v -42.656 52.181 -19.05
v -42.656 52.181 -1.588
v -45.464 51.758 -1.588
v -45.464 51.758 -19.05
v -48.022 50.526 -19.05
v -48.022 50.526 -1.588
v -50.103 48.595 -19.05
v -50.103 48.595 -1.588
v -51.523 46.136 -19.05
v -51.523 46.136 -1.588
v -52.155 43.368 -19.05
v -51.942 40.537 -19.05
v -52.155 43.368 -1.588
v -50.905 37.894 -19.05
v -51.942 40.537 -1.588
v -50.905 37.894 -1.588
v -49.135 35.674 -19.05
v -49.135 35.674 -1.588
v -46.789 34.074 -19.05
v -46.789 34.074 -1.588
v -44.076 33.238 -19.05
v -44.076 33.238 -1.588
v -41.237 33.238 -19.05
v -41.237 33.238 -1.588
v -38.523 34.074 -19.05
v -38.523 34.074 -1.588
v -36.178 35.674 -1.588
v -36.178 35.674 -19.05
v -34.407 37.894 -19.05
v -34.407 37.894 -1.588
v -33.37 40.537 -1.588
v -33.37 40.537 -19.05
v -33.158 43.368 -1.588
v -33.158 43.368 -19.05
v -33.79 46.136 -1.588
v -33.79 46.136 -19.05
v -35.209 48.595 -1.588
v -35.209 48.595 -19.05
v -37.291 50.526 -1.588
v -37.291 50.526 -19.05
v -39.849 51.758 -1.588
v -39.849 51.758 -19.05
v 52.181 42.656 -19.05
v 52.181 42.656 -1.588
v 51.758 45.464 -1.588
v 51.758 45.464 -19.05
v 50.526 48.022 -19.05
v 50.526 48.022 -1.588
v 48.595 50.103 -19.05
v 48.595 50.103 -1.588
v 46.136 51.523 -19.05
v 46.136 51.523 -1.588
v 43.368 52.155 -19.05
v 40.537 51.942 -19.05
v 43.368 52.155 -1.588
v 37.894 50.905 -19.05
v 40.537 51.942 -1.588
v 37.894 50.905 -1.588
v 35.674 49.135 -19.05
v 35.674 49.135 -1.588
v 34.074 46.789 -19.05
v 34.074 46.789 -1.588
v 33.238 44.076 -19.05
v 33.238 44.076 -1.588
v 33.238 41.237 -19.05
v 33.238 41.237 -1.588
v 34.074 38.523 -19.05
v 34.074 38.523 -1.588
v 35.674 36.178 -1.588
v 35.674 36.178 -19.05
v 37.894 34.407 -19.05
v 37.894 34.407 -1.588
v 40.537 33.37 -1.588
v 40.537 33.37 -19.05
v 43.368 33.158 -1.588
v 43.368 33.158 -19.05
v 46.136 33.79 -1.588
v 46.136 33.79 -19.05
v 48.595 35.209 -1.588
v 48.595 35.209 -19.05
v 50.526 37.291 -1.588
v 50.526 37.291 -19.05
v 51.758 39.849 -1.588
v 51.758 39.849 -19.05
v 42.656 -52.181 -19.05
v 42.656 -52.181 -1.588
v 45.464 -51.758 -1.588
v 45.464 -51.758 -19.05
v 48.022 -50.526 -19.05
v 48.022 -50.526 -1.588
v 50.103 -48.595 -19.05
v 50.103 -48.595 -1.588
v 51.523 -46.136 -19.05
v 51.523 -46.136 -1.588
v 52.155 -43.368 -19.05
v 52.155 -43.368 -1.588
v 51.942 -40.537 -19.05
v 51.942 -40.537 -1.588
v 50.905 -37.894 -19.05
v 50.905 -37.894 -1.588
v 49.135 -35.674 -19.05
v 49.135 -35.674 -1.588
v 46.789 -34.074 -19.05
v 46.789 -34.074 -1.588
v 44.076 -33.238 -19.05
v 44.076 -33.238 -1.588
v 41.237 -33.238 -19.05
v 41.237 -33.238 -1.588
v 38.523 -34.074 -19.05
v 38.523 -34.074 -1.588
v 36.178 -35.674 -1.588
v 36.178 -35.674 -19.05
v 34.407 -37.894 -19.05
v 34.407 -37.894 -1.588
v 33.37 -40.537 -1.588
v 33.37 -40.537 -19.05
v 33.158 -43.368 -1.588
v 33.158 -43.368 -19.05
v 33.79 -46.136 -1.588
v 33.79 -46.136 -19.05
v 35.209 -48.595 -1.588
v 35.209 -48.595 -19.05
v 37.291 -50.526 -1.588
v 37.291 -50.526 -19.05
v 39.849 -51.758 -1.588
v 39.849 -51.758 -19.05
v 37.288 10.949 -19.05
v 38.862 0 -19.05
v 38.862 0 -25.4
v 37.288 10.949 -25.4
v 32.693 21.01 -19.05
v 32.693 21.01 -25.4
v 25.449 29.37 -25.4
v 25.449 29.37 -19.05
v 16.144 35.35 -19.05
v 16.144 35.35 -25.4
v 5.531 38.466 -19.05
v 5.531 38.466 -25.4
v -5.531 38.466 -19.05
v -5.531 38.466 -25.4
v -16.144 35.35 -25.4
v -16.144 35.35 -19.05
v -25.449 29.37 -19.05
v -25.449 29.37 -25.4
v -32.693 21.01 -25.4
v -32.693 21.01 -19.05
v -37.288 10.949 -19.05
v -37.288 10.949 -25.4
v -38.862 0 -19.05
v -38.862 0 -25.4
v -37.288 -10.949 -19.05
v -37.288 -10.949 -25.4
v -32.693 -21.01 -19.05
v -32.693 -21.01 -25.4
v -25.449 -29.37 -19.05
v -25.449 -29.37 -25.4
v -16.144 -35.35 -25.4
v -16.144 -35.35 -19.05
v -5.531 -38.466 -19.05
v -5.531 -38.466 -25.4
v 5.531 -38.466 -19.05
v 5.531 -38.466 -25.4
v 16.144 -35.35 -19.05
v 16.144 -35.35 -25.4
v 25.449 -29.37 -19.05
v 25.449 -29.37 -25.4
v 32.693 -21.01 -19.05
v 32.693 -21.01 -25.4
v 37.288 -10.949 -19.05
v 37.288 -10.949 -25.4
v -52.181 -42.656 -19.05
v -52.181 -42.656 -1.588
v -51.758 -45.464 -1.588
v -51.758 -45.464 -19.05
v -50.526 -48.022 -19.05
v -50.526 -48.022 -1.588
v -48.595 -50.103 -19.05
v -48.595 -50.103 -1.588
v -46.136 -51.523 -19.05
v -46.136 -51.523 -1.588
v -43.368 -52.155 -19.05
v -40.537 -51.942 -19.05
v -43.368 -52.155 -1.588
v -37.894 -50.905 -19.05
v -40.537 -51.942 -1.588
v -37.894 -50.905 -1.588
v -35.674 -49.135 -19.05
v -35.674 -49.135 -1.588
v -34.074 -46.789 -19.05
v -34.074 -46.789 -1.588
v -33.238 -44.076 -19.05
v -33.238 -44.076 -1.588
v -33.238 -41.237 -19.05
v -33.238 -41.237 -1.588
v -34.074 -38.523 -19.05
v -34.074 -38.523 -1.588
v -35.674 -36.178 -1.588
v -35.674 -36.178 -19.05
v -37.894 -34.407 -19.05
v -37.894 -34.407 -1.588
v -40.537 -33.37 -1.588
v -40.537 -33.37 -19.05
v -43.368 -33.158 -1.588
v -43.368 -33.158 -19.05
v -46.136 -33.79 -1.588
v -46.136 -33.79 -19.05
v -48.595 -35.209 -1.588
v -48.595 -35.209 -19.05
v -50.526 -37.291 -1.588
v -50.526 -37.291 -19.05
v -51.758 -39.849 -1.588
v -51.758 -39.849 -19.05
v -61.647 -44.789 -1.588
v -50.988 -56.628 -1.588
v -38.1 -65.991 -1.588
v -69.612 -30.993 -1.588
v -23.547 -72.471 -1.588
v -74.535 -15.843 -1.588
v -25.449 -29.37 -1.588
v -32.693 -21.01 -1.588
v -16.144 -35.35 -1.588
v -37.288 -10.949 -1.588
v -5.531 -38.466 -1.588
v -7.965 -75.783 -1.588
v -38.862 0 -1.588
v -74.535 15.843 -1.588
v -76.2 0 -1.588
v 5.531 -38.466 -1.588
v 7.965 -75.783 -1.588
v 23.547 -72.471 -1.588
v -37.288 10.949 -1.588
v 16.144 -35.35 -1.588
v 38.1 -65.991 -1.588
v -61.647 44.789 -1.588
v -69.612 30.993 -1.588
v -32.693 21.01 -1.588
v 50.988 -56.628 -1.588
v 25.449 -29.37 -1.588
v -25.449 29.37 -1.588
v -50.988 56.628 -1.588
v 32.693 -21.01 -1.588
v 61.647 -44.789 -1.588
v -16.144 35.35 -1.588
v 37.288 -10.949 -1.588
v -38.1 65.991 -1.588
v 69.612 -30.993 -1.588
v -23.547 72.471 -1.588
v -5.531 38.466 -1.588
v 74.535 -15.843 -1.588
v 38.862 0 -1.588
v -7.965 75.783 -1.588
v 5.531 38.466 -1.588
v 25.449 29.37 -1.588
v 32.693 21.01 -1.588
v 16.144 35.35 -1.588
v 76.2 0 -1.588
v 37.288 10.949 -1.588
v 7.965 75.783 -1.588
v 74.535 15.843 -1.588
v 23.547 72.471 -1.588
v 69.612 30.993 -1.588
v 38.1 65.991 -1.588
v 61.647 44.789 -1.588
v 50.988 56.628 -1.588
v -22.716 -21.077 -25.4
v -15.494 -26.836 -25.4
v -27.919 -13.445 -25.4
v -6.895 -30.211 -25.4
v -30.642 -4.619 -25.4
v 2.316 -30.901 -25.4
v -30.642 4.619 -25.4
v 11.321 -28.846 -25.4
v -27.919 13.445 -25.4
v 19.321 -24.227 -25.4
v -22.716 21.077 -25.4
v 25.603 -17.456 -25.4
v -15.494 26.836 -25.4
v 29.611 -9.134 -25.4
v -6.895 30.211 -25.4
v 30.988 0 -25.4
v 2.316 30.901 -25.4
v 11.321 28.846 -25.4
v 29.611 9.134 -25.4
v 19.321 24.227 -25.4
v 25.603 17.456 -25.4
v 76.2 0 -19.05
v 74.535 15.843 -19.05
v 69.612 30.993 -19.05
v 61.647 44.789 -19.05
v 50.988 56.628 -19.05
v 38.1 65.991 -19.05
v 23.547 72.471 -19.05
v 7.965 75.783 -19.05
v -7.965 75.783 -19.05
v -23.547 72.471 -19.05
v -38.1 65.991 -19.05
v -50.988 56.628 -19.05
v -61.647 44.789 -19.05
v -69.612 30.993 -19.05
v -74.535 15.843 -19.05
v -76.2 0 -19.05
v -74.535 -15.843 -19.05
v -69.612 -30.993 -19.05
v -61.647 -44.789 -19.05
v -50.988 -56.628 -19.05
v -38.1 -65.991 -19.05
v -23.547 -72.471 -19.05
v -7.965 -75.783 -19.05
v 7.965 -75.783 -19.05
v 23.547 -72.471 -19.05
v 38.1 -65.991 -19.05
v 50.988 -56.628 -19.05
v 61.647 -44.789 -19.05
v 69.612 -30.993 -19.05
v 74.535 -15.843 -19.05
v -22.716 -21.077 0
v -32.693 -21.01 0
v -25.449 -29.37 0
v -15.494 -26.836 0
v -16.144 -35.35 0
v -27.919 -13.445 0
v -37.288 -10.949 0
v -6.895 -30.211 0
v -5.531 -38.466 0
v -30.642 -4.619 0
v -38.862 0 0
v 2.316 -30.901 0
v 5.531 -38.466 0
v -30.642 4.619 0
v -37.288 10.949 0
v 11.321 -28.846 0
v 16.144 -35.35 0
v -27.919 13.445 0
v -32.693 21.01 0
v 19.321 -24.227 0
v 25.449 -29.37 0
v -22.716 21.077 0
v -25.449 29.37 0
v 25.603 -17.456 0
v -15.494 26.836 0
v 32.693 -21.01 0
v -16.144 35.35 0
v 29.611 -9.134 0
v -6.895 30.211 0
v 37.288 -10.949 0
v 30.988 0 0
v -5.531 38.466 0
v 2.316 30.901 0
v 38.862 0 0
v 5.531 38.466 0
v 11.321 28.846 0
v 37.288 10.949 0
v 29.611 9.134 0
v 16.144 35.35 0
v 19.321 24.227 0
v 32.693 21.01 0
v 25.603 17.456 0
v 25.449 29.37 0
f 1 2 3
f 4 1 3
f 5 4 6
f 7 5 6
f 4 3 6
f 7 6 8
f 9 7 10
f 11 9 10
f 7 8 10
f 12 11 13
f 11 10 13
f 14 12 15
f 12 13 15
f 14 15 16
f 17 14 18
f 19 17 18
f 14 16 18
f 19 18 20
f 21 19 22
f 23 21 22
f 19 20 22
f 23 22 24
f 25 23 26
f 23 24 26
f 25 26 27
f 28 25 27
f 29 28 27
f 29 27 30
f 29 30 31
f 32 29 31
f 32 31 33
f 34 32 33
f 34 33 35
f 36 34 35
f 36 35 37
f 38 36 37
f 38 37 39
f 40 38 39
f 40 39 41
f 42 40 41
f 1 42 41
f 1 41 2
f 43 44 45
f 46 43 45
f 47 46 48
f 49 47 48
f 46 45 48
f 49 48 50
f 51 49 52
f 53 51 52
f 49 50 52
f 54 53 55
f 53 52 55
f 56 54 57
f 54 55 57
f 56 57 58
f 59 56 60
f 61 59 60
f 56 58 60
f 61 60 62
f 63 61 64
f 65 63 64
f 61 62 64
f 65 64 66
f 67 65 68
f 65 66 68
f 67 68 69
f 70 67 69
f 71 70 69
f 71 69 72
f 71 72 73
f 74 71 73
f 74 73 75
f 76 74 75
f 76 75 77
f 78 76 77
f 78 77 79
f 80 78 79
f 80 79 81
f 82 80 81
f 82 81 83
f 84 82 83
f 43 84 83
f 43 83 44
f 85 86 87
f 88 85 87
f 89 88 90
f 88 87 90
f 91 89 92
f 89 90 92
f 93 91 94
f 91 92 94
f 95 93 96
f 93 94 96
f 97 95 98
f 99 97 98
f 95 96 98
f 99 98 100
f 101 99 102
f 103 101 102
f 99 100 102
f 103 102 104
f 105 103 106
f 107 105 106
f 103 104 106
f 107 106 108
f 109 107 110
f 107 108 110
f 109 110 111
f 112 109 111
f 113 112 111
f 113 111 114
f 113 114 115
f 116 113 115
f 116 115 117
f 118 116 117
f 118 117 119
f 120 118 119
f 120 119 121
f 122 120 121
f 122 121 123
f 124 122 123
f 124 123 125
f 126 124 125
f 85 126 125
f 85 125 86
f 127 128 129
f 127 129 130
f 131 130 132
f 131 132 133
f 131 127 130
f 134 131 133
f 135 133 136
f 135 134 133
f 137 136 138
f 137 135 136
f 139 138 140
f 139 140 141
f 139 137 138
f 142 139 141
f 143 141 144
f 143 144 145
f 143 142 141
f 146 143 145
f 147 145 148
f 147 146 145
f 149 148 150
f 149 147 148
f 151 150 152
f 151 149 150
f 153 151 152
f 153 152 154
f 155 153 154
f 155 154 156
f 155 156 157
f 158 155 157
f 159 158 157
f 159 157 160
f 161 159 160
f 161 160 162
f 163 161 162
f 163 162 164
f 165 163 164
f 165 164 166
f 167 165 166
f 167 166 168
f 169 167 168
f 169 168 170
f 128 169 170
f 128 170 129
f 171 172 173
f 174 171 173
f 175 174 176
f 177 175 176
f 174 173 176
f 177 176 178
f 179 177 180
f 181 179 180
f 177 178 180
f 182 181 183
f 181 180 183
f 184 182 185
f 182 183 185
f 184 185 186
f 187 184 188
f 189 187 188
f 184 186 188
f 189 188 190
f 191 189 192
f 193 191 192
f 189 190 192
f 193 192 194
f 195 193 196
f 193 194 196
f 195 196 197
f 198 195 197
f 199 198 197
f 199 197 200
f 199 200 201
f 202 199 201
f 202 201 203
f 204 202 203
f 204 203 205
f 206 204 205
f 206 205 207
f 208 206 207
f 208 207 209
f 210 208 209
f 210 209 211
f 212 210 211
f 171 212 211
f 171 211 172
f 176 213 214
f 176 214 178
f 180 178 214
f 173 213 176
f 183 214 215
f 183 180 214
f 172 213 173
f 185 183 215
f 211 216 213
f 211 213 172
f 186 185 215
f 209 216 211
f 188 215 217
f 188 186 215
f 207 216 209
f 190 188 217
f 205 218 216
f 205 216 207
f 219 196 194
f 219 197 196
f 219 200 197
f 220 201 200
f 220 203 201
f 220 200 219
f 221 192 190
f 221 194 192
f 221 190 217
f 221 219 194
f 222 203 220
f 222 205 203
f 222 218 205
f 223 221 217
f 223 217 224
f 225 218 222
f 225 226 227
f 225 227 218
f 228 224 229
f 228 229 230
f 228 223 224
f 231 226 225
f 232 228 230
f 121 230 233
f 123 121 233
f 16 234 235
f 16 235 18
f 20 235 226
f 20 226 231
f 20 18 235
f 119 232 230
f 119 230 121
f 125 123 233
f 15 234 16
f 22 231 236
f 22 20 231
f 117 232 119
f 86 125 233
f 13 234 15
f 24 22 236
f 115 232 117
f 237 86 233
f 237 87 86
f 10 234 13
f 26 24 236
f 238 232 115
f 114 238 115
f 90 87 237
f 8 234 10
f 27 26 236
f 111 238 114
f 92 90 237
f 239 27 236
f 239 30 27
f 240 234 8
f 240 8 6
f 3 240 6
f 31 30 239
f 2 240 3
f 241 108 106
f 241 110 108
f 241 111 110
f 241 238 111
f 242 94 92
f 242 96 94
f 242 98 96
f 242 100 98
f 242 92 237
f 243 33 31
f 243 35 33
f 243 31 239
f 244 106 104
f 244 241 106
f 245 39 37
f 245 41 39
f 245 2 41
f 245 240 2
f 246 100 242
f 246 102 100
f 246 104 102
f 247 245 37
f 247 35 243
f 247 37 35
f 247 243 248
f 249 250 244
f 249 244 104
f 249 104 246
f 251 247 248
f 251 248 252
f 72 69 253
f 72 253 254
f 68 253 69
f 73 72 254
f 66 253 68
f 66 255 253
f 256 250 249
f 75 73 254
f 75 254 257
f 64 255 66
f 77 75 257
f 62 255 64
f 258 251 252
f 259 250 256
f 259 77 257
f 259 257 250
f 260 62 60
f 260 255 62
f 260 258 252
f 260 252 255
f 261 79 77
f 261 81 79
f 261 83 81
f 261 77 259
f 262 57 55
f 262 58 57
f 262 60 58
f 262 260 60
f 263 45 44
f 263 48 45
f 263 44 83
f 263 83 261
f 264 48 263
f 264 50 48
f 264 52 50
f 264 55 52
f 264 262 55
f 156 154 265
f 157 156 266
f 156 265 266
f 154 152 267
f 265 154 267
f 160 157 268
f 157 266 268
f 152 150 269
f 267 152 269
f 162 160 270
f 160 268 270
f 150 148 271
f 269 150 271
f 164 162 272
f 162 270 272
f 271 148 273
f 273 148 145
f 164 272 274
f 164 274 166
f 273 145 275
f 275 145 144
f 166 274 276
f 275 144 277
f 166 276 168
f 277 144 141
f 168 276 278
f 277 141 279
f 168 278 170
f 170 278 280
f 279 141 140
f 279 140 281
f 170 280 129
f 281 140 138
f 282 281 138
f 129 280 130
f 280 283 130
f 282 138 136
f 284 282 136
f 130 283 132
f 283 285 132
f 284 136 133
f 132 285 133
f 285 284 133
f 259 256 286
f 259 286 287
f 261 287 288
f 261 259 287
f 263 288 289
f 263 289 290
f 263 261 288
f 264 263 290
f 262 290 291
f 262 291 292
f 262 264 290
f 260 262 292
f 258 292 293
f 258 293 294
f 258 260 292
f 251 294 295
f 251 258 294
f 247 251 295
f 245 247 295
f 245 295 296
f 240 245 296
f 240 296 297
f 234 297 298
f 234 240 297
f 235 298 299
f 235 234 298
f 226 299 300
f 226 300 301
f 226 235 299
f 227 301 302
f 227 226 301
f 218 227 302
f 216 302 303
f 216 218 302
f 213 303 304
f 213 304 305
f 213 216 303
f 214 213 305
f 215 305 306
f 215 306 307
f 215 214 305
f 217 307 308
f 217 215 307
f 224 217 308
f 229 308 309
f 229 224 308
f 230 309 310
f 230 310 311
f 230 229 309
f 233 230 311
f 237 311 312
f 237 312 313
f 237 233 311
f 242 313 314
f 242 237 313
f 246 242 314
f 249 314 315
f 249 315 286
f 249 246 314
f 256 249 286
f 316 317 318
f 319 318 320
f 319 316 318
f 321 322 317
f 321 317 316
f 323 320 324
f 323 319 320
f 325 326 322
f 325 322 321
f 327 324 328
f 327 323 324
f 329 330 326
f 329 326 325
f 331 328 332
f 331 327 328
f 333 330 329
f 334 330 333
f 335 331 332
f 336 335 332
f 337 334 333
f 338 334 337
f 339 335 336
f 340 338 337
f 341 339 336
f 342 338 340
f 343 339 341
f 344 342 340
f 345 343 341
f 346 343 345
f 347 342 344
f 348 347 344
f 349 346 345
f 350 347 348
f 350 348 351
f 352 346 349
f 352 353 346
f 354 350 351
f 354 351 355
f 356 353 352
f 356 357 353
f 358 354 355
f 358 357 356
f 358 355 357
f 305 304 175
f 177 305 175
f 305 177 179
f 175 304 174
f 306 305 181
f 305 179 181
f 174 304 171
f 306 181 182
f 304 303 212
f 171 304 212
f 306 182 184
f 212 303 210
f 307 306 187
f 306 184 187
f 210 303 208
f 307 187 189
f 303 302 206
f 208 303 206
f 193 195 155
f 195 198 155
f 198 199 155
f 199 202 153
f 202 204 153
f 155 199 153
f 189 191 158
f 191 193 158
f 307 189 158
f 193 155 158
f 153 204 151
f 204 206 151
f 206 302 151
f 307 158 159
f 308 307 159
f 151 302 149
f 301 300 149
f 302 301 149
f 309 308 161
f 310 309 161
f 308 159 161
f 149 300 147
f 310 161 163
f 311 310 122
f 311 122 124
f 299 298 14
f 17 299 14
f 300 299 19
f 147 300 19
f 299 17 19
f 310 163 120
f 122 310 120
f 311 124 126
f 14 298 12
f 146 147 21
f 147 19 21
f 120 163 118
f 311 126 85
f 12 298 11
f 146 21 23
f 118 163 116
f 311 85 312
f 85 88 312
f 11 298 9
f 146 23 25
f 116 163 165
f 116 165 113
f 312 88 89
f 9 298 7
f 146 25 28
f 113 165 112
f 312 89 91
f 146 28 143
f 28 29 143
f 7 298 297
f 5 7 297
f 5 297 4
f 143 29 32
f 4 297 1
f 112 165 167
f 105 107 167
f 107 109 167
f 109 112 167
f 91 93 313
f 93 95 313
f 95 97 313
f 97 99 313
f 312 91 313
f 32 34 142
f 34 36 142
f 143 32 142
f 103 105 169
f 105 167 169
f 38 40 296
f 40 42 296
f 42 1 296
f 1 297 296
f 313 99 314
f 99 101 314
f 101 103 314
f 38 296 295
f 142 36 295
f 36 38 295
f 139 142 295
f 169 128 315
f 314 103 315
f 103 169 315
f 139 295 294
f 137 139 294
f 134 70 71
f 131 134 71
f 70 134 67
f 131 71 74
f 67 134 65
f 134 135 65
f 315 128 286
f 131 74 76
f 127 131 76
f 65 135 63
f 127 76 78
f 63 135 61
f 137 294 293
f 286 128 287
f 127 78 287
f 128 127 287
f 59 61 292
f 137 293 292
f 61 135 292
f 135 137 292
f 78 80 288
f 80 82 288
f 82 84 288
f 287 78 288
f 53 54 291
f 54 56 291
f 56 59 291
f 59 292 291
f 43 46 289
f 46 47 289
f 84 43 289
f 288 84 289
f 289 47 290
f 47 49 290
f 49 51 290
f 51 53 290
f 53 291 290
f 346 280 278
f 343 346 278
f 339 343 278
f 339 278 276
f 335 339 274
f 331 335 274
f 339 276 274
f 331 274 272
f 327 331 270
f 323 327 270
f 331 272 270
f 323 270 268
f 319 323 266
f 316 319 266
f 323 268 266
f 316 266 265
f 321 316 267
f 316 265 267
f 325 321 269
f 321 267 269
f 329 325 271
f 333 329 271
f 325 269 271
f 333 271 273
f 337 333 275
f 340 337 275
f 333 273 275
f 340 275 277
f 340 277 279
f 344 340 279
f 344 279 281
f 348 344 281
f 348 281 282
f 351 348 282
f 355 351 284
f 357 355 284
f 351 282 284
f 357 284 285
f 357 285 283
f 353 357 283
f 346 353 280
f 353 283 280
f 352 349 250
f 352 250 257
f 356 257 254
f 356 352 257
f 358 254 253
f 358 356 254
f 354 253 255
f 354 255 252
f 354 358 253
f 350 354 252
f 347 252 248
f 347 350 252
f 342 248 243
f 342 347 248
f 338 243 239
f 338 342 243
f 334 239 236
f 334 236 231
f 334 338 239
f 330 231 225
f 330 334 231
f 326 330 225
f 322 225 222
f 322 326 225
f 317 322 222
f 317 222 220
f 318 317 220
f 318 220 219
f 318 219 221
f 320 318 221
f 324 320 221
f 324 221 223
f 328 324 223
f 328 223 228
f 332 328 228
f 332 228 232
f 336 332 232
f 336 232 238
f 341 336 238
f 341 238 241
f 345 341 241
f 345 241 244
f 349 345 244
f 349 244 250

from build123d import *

# Parameters (mm, degrees)
HUB_DIAMETER_R                = 38.862
HUB_DEPTH                     = 25.4
FLANGE_DIAMETER_R             = 76.2
FLANGE_DEPTH                  = 17.4625
REVOLUTION_PROFILE_FOR_BORE_W = 30.988
REVOLUTION_PROFILE_FOR_BORE_H = 228.6
BOLT_DIAMETER_R               = 9.525
BOLT_HOLE_DEPTH               = 111.362652905
BOLT_HOLE_PATTERN_COUNT       = 4
BOLT_HOLE_PATTERN_ANGLE       = 270


with BuildPart() as part:
    # Hub Diameter → Hub (new body)
    with BuildSketch(Plane.XY):
        Circle(HUB_DIAMETER_R)
    extrude(amount=-HUB_DEPTH)

    # Flange Diameter → Flange (add)
    with BuildSketch(Plane.XY.offset(-1.5875)):
        Circle(FLANGE_DIAMETER_R)
    extrude(amount=-FLANGE_DEPTH)

    # Revolution profile for Bore → Bore (revolve, cut)
    with BuildSketch(Plane(origin=(0, 0, 0), x_dir=(1, 0, 0), z_dir=(0, 1, 0))):
        with Locations((15.494, 114.3)):
            Rectangle(REVOLUTION_PROFILE_FOR_BORE_W, REVOLUTION_PROFILE_FOR_BORE_H)
    revolve(axis=Axis((0, 0, 19.52131148), (0, 0, -1)), mode=Mode.SUBTRACT)

    # Bolt Diameter → Bolt Hole (cut, through all)
    with BuildSketch(Plane.XY.offset(-1.5875)):
        with Locations((42.656216575, 42.656216575)):
            Circle(BOLT_DIAMETER_R)
    bolt_hole = extrude(amount=-BOLT_HOLE_DEPTH, mode=Mode.SUBTRACT)

    # Bolt Hole Pattern: Bolt Hole ×4 about axis
    bolt_hole_pattern_axis = Axis((0, 0, -50), (0, 0, 1))
    for i in range(1, BOLT_HOLE_PATTERN_COUNT):
        add(bolt_hole.rotate(bolt_hole_pattern_axis, i * BOLT_HOLE_PATTERN_ANGLE / (BOLT_HOLE_PATTERN_COUNT - 1)), mode=Mode.SUBTRACT)


solid = part.part
